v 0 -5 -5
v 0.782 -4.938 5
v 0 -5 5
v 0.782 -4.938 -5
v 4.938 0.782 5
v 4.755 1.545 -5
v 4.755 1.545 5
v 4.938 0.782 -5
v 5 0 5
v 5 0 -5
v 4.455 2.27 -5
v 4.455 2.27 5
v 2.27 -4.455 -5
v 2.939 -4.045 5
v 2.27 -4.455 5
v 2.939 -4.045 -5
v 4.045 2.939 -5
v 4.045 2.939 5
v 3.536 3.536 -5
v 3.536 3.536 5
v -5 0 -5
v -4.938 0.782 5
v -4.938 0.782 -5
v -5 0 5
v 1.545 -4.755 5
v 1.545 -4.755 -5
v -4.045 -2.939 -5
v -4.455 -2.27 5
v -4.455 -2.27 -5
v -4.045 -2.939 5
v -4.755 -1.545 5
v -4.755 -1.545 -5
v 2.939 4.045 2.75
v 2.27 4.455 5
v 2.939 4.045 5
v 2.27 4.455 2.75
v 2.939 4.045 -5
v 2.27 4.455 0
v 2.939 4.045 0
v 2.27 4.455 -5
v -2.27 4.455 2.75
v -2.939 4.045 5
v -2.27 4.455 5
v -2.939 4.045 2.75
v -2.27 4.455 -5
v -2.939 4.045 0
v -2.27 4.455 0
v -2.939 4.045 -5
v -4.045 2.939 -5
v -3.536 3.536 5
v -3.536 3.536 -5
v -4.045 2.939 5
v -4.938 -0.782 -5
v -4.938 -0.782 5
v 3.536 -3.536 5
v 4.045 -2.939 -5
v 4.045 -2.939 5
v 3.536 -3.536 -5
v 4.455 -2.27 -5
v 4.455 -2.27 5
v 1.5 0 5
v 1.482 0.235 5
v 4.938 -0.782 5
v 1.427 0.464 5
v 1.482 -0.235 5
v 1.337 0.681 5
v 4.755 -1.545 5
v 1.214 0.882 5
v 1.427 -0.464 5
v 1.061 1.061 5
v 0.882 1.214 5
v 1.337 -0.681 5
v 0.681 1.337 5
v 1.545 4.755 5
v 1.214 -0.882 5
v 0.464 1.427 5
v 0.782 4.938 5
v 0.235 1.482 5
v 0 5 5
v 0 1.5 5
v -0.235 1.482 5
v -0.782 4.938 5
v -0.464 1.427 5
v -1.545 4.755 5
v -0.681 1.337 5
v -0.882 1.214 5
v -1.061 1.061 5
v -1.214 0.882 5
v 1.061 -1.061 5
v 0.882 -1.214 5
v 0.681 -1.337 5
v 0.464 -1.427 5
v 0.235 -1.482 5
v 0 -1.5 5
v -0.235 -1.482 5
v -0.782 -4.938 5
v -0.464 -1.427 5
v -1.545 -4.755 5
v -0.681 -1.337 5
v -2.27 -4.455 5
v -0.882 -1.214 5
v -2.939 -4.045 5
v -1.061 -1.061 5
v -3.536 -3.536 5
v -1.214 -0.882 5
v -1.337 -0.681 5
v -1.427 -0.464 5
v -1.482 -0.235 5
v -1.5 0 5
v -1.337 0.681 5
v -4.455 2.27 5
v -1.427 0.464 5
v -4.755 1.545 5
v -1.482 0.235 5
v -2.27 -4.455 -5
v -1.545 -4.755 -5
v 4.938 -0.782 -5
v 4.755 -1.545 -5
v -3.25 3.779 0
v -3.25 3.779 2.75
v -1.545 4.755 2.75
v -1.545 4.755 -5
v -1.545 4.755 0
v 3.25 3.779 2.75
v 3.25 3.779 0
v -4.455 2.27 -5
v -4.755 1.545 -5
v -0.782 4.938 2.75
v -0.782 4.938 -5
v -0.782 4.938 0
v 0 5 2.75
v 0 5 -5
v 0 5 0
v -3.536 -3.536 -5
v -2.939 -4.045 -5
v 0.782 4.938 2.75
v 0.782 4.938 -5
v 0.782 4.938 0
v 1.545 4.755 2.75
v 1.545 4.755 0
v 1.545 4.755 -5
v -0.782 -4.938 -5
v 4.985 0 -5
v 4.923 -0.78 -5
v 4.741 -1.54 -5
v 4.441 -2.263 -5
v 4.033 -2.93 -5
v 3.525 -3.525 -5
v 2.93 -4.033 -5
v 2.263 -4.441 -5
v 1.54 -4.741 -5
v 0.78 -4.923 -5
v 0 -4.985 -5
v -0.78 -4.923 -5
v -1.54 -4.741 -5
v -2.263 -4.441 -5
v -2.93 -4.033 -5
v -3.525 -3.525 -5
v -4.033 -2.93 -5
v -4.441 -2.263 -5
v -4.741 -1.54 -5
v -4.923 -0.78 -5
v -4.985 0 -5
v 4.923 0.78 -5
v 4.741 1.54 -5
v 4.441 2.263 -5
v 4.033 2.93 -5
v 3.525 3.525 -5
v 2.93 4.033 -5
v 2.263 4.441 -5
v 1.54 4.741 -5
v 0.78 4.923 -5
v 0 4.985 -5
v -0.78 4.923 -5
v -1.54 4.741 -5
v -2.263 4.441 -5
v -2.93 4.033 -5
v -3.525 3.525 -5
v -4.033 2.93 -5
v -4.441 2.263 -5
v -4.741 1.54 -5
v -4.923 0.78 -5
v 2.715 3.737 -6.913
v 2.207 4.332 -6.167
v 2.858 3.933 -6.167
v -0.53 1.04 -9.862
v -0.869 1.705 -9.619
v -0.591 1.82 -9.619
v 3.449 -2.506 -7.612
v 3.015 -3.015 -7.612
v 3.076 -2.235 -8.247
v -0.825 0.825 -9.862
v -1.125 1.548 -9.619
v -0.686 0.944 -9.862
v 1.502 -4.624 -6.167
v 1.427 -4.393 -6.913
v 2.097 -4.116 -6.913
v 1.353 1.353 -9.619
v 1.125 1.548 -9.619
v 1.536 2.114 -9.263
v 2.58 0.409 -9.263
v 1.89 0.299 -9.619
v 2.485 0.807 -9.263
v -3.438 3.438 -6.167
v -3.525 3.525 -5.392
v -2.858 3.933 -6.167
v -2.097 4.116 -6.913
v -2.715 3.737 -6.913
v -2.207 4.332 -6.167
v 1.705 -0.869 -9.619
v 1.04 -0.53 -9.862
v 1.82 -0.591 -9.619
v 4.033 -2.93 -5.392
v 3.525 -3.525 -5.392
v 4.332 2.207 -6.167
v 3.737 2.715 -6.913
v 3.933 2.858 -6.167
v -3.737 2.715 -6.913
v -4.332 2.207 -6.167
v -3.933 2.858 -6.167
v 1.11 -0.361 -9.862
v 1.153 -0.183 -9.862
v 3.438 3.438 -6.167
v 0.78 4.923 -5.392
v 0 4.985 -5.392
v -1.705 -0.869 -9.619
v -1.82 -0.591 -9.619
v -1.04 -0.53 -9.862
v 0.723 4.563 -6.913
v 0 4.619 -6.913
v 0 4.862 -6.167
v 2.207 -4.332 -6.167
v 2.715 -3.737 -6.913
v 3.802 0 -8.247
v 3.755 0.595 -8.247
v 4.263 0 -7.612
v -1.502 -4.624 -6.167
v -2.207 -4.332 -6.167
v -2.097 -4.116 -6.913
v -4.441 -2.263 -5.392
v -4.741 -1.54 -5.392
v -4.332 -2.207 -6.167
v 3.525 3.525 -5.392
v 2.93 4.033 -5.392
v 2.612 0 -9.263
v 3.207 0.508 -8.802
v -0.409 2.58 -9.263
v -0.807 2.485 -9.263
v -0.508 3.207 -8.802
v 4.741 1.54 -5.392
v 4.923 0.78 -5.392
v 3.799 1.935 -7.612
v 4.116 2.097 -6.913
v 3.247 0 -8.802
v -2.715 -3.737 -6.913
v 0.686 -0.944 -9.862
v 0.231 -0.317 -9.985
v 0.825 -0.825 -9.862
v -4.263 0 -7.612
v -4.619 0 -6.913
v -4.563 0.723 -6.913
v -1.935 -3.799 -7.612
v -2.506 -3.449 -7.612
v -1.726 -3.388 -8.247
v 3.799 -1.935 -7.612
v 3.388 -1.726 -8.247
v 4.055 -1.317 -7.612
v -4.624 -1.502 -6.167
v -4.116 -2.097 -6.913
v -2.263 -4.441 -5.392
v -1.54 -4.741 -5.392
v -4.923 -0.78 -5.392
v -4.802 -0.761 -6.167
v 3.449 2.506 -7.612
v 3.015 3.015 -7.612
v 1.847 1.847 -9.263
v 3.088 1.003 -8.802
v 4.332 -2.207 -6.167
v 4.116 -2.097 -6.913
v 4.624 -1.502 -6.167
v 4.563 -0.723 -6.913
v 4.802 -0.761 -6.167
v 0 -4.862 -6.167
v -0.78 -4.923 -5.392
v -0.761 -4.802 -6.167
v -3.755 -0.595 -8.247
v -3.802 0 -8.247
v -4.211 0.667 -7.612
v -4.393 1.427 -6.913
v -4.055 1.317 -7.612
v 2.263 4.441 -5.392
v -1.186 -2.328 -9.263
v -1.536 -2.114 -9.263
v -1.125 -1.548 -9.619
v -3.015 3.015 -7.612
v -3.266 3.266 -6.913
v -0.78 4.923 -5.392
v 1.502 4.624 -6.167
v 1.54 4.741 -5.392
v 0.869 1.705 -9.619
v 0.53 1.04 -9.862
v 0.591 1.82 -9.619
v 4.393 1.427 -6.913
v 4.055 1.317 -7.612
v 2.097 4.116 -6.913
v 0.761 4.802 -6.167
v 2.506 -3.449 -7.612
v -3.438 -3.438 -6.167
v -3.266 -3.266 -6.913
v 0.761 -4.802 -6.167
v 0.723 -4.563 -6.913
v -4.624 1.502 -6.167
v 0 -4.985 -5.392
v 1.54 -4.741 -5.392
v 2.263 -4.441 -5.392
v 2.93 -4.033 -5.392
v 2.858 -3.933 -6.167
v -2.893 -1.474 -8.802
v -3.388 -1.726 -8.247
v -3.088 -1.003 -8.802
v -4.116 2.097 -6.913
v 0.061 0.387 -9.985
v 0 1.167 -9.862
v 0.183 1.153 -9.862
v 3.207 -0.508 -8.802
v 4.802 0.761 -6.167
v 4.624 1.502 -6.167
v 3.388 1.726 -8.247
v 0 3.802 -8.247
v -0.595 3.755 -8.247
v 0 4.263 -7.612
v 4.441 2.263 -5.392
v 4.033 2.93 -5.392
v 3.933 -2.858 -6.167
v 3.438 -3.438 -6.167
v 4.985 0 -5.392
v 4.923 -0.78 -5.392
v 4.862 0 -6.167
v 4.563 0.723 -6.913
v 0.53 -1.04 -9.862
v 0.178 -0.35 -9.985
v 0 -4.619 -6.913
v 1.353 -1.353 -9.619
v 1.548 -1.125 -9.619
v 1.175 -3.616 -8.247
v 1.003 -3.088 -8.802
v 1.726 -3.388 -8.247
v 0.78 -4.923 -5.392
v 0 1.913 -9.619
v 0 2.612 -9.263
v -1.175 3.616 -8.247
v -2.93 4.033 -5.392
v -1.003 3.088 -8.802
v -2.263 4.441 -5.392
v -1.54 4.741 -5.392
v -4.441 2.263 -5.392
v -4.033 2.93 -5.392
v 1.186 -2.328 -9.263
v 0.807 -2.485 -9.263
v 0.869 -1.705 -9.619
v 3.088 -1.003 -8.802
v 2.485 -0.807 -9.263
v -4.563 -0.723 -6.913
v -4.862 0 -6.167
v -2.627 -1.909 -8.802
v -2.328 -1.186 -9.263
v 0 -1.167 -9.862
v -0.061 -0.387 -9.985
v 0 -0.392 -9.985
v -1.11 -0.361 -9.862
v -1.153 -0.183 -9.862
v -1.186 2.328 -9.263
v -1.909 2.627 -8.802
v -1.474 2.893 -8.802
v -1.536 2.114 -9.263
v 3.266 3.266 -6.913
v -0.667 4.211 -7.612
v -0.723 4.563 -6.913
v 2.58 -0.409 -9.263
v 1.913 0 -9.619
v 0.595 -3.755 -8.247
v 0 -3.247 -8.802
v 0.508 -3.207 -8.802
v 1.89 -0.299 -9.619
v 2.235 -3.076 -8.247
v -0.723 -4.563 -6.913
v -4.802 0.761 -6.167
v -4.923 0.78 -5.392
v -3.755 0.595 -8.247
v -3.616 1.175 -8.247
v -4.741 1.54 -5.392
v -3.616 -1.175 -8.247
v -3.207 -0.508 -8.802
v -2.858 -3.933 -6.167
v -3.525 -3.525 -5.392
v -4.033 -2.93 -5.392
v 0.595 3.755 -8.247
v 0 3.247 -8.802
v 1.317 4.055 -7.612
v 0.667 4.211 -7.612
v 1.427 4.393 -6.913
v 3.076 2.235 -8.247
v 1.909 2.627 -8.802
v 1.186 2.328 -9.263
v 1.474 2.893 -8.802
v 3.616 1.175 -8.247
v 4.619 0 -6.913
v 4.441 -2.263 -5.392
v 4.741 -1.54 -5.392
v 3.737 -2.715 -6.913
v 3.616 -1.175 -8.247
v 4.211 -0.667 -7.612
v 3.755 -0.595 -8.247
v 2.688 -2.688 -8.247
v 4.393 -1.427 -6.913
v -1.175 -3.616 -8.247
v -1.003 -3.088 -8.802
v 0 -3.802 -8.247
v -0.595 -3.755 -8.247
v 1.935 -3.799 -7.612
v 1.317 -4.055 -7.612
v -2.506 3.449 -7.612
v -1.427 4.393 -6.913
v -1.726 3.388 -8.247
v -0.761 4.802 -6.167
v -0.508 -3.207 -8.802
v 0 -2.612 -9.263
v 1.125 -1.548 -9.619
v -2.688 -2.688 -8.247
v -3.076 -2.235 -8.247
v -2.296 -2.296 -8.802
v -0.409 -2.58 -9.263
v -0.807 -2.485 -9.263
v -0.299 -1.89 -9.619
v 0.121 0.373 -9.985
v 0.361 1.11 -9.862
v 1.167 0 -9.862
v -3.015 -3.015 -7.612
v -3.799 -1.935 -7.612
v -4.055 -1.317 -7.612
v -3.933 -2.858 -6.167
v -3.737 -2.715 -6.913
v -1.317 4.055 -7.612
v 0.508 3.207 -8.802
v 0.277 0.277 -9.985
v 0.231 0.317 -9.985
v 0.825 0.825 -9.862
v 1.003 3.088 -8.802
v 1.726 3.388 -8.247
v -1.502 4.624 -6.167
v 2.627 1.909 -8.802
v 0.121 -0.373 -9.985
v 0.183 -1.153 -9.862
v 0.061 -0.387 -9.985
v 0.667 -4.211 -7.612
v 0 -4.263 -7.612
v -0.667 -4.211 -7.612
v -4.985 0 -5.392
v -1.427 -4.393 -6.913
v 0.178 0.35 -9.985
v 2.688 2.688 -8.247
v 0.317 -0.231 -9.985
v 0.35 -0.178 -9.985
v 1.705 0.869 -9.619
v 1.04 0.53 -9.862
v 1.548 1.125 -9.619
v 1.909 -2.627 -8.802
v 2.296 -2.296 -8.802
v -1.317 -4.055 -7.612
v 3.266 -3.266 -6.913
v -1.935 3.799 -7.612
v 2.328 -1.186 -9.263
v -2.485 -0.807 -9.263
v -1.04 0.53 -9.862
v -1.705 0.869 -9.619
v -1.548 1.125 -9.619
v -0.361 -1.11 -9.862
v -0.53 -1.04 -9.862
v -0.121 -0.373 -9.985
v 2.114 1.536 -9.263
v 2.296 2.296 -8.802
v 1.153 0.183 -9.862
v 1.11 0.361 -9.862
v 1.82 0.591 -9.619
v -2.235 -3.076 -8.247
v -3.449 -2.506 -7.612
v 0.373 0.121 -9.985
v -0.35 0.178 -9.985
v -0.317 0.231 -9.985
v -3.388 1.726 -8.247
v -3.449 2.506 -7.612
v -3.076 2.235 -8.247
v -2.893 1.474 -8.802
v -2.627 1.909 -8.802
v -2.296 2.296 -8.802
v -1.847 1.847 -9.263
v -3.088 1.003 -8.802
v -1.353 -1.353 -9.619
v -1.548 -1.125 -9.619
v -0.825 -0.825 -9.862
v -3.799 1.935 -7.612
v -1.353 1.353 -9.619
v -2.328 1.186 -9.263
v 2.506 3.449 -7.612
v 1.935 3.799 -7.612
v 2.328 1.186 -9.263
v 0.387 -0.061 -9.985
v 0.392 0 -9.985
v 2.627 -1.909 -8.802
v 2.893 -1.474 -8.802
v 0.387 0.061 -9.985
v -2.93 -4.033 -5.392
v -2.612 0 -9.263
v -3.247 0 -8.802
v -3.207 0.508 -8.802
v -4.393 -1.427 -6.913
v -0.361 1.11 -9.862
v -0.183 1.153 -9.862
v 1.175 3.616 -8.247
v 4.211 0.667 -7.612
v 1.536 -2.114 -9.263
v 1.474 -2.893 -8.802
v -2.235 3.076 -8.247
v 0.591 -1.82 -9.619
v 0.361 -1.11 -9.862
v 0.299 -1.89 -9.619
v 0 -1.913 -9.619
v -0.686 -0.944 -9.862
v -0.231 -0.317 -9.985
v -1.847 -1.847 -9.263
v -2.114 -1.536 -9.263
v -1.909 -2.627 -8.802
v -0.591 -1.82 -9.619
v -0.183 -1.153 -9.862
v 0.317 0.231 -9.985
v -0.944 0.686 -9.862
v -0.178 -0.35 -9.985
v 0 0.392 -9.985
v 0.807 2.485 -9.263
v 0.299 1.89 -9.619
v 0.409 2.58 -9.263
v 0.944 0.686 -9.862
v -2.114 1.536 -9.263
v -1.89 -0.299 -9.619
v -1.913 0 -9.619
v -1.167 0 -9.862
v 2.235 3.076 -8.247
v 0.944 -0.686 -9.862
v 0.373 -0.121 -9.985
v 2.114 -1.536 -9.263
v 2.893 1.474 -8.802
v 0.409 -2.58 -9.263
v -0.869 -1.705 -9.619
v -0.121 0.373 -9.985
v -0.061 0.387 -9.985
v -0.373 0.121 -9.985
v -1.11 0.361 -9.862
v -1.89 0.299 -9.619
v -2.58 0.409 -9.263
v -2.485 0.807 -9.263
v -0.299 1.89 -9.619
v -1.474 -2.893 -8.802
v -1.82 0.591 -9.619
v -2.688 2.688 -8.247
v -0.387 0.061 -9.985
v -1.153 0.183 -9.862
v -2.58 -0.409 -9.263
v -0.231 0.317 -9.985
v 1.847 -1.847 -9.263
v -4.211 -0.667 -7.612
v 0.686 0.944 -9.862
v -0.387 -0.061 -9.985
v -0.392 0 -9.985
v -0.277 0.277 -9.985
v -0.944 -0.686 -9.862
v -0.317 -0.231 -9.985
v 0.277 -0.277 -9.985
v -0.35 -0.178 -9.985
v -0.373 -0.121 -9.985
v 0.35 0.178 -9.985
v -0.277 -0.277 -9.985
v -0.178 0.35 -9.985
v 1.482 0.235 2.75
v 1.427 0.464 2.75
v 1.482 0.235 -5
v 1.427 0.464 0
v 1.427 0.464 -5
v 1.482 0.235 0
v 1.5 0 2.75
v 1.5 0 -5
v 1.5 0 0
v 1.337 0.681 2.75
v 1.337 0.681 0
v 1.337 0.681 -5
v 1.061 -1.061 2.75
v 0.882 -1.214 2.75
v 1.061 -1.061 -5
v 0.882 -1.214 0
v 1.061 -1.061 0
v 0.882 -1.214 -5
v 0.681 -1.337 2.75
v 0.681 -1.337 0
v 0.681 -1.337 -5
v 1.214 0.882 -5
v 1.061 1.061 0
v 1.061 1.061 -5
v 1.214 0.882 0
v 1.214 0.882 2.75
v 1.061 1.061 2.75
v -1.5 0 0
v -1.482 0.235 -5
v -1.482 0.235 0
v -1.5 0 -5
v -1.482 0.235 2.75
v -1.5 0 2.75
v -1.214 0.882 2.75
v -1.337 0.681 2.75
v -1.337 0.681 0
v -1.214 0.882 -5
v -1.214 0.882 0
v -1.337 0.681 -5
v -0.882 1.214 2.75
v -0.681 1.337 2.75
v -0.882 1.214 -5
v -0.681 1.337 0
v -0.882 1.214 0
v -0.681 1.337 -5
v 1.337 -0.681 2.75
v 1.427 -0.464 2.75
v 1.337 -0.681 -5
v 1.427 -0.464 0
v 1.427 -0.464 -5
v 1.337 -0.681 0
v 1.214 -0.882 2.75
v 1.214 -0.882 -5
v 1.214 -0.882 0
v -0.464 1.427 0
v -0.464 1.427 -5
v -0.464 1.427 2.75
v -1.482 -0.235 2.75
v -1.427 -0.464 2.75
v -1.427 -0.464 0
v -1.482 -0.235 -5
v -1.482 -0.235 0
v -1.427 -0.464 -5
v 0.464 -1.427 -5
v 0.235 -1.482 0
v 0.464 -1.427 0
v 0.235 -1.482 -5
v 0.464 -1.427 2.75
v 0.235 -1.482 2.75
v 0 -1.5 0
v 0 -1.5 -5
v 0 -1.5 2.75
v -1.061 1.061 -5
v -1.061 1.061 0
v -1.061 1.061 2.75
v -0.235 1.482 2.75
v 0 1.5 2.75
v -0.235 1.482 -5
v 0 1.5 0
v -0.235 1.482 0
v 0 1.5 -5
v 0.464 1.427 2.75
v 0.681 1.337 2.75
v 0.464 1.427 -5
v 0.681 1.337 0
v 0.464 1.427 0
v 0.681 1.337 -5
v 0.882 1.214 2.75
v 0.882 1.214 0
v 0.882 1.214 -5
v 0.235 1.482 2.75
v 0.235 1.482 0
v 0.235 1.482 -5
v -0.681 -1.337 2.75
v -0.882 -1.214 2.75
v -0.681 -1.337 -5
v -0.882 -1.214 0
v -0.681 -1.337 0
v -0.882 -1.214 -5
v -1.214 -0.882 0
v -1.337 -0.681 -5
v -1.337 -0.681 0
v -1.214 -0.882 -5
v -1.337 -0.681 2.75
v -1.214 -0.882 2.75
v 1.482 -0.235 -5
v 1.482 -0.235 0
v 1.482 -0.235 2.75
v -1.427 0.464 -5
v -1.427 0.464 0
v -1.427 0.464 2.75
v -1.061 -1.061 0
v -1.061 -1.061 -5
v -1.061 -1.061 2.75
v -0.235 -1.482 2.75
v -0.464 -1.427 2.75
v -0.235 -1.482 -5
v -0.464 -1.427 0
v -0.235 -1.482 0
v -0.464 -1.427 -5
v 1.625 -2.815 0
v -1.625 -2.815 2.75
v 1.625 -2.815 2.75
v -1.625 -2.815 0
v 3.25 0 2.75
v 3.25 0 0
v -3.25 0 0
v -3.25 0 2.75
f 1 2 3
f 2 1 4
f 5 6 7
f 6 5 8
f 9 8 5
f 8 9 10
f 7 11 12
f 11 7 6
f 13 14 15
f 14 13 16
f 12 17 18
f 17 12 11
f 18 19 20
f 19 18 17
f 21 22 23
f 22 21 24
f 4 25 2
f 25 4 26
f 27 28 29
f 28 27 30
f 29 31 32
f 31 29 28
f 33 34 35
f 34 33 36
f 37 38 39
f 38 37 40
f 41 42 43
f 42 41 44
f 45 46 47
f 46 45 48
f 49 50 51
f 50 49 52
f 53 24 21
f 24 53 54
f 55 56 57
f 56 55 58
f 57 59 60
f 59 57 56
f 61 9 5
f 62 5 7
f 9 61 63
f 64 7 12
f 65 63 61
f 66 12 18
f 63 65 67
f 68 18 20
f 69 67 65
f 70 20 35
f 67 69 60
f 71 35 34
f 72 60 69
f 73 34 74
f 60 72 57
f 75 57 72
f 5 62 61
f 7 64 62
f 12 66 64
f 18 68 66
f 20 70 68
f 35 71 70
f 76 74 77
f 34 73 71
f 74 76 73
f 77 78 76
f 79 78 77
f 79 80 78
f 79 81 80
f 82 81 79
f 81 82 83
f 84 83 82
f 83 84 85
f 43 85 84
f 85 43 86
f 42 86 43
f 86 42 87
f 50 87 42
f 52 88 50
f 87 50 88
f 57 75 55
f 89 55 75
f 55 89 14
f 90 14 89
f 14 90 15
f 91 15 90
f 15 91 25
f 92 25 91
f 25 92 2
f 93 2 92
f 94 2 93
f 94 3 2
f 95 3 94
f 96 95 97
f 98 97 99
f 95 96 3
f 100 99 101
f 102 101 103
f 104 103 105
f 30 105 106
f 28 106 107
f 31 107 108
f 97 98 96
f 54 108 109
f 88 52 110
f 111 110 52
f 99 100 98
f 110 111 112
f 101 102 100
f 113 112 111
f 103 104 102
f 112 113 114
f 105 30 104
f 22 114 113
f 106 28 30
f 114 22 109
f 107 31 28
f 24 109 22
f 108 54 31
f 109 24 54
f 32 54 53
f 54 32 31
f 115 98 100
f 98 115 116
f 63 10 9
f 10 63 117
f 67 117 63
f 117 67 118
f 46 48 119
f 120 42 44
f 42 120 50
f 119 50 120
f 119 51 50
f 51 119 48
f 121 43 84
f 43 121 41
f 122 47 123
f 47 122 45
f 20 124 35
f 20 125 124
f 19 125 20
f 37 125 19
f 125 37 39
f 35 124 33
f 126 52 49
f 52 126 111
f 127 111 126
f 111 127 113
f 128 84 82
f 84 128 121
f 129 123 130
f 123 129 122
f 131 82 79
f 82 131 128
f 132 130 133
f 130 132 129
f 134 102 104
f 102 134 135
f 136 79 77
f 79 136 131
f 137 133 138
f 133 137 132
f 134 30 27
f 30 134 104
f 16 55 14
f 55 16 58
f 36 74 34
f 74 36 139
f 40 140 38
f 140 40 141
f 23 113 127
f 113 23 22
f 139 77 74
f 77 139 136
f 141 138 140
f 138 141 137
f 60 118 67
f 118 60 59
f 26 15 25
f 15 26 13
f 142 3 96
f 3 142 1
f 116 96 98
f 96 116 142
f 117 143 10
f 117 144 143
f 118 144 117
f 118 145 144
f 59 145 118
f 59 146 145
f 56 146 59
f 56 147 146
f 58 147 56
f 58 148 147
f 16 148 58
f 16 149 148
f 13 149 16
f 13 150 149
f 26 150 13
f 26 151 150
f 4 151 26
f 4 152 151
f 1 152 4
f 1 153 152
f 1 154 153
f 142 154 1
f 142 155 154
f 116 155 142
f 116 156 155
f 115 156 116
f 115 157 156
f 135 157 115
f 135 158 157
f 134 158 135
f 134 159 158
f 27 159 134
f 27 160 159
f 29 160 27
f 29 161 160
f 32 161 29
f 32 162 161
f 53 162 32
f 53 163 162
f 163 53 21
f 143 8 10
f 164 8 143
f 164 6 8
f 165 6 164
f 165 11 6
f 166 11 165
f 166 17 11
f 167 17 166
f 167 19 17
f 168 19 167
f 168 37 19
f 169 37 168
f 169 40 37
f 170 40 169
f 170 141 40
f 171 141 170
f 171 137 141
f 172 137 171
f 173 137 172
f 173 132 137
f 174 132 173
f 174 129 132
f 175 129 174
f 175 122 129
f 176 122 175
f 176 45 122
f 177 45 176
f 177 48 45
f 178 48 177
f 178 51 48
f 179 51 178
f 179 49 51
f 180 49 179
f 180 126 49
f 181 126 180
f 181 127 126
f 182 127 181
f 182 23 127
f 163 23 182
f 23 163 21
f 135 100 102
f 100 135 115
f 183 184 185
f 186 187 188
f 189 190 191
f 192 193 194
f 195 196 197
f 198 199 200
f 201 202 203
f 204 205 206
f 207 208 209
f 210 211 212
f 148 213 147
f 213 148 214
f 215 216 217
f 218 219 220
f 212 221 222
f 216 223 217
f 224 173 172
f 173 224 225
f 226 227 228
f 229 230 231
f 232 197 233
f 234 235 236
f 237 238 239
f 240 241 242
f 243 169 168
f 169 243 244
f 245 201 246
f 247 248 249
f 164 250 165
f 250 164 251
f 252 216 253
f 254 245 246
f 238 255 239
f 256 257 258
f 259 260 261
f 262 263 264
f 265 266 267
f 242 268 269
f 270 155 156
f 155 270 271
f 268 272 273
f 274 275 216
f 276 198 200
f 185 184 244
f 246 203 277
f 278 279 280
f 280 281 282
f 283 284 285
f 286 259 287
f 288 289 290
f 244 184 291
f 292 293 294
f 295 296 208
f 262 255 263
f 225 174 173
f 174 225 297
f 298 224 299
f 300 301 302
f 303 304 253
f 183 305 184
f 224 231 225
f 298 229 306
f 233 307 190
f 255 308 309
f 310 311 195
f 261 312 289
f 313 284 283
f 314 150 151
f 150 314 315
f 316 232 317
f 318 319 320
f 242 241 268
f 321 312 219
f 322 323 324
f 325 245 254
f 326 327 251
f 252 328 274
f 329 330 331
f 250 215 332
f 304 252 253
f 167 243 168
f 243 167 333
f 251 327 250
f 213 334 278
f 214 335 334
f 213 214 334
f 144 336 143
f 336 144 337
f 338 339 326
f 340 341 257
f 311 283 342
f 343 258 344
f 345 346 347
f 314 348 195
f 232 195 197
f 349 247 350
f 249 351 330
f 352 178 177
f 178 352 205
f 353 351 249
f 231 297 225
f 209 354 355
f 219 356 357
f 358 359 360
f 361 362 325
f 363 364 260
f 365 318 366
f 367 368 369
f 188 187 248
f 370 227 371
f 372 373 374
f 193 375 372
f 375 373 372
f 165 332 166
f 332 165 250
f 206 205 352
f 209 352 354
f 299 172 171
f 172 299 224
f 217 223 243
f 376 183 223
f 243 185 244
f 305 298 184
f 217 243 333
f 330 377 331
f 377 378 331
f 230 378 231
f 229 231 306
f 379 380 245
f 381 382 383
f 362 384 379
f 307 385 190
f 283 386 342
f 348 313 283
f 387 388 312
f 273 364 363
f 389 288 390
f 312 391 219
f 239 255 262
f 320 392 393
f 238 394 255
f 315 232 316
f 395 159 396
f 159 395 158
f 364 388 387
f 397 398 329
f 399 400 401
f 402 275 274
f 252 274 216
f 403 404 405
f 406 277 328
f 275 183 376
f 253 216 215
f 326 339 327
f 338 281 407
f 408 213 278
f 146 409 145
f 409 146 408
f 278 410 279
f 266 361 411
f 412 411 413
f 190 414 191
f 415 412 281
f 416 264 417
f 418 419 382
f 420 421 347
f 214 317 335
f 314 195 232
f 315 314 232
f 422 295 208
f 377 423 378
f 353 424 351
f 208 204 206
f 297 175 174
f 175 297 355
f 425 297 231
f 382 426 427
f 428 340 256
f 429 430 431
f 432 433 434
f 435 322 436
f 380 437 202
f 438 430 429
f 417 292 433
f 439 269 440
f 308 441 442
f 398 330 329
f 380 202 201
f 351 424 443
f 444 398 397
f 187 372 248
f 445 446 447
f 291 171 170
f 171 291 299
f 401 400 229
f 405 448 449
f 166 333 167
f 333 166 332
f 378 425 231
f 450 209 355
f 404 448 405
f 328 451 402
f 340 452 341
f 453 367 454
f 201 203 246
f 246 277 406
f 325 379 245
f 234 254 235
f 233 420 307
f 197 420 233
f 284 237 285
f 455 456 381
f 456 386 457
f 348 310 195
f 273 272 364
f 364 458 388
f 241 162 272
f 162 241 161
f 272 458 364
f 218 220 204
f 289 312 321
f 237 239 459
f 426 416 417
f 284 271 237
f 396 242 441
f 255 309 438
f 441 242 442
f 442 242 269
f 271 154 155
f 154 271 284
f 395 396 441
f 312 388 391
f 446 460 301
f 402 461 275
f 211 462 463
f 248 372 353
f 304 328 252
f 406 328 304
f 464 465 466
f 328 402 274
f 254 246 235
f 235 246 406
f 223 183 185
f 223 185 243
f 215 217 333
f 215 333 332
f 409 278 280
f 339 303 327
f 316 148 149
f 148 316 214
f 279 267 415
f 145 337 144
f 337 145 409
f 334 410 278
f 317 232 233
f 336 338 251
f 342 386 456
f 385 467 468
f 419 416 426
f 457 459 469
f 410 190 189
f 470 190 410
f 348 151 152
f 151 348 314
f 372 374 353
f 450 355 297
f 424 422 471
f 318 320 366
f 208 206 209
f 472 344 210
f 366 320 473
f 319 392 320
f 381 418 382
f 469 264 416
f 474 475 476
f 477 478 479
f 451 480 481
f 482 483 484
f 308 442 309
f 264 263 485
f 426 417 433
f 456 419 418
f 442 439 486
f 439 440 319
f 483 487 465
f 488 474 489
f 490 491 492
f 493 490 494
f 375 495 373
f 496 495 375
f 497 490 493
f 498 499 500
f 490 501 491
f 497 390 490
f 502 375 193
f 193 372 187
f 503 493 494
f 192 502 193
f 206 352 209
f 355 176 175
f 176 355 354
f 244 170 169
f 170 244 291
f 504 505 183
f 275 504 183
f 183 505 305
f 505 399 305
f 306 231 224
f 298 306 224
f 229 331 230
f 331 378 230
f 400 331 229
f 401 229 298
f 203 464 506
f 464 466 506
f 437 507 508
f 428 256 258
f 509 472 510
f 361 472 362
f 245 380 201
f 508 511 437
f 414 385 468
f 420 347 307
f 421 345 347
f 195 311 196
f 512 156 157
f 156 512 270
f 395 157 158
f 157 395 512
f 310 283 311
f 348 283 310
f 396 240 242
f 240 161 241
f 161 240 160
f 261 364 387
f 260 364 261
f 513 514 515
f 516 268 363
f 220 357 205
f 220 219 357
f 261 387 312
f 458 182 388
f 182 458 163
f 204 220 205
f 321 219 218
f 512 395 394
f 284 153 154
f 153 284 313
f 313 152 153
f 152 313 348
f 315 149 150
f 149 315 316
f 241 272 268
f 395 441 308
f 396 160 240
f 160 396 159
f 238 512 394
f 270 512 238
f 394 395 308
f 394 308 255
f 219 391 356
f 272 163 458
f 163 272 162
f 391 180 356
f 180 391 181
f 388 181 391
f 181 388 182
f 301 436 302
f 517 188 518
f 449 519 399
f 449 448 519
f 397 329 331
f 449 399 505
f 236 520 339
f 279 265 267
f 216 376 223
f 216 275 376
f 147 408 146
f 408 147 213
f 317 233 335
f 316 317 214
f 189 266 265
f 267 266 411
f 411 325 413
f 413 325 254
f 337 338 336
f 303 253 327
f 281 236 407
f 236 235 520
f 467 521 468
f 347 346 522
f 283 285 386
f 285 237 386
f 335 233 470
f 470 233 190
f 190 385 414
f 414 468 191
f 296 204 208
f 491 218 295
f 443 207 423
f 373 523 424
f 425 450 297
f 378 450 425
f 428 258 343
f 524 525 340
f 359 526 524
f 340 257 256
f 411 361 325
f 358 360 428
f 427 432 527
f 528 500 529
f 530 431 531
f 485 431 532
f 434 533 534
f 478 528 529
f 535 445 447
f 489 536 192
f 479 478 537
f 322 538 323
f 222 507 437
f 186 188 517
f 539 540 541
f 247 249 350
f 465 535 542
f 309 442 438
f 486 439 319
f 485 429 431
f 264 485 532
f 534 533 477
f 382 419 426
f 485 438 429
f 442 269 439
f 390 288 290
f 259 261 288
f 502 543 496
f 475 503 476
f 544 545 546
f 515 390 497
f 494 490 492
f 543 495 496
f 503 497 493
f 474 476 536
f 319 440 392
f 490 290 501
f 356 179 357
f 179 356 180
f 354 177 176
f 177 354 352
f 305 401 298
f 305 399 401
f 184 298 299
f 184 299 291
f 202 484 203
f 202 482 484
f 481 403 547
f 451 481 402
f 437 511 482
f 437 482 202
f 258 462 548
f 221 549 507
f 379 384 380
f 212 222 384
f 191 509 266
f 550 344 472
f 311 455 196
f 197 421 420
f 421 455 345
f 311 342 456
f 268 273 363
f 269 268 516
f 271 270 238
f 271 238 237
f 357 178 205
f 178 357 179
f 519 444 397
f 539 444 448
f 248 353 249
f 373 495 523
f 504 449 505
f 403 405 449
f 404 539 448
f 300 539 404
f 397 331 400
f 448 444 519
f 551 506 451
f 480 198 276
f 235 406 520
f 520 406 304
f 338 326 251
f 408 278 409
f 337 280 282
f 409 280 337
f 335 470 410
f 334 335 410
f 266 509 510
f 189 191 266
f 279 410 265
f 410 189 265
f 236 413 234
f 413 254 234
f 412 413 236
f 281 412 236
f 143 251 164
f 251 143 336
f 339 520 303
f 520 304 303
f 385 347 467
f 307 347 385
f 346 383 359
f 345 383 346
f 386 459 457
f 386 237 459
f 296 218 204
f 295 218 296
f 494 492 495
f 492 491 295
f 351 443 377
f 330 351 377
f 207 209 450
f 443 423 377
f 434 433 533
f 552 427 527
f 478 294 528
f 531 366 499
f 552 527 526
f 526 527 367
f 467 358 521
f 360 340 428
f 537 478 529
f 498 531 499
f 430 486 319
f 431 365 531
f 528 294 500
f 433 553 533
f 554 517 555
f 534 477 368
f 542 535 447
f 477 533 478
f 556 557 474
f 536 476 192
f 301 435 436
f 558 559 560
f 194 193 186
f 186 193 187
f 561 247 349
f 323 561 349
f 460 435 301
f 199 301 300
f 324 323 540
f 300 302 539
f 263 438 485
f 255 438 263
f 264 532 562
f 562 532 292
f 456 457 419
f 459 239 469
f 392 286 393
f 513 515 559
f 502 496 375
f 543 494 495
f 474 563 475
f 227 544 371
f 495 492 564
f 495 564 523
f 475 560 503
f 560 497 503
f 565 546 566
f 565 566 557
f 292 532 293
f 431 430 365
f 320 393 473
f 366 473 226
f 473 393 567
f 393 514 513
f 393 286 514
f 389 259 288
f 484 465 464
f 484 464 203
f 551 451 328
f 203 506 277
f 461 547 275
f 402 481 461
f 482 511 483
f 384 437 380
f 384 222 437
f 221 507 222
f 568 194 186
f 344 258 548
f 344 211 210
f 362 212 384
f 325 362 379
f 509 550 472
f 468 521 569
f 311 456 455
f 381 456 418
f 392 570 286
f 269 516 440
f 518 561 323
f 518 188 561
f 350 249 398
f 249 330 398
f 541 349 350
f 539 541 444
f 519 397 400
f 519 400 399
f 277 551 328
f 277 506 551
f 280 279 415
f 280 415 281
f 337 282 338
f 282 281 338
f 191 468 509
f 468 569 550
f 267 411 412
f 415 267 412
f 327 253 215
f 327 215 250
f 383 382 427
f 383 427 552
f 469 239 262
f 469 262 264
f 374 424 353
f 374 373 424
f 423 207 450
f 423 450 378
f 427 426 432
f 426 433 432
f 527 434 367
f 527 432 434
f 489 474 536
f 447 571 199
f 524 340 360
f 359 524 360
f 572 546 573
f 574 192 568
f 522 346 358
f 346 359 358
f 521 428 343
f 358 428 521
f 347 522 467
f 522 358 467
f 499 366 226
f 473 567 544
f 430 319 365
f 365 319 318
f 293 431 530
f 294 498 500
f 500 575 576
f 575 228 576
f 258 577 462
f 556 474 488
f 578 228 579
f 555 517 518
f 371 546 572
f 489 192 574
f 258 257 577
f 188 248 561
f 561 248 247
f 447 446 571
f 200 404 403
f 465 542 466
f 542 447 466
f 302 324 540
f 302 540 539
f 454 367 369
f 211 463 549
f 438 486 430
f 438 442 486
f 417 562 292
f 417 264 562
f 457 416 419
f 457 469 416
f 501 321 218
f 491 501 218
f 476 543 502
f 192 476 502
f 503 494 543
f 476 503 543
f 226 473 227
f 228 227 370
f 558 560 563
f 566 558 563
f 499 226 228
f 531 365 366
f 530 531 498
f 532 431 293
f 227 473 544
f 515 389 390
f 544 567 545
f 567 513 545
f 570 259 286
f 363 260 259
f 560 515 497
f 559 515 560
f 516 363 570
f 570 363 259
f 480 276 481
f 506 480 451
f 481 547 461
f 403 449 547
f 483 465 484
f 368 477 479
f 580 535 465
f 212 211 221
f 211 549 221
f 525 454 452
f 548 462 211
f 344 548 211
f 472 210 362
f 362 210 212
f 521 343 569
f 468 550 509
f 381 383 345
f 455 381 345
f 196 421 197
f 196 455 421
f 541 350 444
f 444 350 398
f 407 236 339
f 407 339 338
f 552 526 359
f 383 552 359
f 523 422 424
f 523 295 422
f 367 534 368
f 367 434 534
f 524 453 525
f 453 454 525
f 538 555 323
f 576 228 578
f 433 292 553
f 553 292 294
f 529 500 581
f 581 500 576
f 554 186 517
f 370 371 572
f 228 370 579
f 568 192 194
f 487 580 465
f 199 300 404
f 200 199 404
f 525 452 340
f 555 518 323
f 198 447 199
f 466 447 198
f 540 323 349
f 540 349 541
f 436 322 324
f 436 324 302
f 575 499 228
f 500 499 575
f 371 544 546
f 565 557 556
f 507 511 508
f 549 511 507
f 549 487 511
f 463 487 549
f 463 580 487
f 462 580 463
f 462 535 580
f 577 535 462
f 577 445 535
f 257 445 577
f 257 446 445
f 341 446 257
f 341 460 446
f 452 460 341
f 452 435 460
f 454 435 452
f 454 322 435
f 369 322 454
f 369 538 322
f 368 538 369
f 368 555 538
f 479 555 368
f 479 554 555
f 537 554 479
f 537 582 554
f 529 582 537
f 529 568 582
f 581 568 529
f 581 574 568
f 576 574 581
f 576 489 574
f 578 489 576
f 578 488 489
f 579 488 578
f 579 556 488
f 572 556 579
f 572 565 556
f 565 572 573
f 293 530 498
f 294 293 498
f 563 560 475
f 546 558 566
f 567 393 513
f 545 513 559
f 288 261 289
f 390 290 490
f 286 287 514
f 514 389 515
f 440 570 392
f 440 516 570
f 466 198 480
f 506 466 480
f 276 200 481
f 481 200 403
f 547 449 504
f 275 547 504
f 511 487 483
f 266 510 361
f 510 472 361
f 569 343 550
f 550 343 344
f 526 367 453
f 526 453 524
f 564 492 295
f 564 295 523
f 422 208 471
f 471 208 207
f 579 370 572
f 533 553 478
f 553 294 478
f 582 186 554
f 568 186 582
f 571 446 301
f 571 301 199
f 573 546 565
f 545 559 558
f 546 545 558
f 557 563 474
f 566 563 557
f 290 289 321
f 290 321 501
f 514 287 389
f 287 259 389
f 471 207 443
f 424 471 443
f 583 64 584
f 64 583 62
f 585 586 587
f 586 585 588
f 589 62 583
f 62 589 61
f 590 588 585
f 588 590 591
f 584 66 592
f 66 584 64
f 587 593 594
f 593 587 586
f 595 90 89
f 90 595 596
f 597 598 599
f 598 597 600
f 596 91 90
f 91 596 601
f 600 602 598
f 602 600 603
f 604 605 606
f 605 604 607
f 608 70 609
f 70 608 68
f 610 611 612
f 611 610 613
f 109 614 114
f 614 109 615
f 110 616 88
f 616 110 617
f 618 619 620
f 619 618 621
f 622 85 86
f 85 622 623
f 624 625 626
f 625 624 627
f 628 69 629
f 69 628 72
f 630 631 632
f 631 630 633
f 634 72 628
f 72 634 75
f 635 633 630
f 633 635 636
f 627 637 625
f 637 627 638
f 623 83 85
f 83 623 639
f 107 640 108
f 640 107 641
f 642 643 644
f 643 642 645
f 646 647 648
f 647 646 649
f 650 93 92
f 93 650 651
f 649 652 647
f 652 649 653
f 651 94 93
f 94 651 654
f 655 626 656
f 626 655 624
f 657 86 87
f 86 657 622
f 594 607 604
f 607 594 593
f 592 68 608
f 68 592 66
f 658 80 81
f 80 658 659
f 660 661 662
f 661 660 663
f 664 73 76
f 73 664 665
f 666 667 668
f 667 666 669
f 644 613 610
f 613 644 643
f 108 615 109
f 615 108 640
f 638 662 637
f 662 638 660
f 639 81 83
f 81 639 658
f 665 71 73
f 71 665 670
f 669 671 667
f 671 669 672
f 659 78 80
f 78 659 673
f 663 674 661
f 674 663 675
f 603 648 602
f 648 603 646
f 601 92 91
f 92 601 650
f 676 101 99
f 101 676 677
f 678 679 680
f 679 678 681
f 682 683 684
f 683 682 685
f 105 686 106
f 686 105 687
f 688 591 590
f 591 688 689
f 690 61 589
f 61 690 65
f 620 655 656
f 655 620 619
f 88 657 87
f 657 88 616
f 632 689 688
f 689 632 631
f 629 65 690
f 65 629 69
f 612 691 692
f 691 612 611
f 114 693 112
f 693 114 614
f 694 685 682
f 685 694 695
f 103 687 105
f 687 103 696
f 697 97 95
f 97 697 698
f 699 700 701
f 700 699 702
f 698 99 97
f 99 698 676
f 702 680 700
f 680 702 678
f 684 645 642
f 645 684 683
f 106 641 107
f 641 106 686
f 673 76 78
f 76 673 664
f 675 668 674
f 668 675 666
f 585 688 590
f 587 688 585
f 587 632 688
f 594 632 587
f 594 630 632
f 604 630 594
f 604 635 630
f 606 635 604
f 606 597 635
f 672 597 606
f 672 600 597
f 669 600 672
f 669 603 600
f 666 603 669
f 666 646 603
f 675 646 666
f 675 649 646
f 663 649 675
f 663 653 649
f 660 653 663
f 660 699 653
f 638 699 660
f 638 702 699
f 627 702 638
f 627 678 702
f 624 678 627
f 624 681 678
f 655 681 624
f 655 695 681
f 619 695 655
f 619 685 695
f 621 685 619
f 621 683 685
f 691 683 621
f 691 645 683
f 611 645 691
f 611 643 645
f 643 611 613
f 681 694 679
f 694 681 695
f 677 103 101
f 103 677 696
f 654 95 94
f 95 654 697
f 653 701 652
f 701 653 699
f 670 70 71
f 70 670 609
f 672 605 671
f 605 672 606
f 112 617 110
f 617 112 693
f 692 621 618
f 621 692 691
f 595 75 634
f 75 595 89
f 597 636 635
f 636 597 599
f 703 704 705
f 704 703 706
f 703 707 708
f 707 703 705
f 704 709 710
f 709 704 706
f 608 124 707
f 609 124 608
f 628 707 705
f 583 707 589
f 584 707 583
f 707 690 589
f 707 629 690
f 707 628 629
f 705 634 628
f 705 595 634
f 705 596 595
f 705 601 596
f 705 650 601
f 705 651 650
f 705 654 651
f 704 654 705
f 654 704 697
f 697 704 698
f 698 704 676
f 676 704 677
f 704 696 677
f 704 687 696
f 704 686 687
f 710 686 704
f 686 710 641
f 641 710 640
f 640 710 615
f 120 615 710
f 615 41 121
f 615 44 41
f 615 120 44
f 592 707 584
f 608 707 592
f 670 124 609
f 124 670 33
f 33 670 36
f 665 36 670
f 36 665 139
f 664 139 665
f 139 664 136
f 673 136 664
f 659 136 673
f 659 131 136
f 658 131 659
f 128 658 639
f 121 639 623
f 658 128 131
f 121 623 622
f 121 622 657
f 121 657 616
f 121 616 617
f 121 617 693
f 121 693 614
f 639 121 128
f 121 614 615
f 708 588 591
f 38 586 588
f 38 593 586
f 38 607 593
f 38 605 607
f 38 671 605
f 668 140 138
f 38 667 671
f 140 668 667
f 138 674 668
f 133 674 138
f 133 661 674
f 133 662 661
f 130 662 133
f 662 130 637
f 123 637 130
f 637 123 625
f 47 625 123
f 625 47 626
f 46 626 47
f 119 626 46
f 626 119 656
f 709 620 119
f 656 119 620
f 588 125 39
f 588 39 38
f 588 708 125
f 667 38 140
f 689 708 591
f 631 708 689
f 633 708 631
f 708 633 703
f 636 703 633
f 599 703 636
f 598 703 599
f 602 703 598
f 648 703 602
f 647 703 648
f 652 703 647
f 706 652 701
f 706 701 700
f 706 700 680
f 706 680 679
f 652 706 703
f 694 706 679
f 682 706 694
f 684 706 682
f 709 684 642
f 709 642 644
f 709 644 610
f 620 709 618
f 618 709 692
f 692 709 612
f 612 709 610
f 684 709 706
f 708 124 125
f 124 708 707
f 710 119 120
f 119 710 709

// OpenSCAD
/*
Quadrysteria QR200 landing feet  (c) by Jorge Monteiro

Quadrysteria QR200 landing feet is licensed under a
Creative Commons Attribution-ShareAlike 4.0 International.

You should have received a copy of the license along with this
work.  If not, see <http://creativecommons.org/licenses/by-sa/4.0/>.
*/
/* [Basics] */
// Set 0 to use M2.5 screw and nuts or 1 to use M3 screw and nuts
useM3nut=0;//[0:1]

/* [Ignore] */
$fn=40*1;
m25nut=5*1;
m25nuth=2*1;
m25screw=2.5*1;
m3nut=5.5*1;
m3nuth=2.4*1;
m3screw=3*1;
gap=0.5*1;

if (useM3nut==1) {
    echo("M3");
    screw=m3screw+gap;
    nut=m3nut+gap*3;
    nutHeight=m3nuth+gap*1.5;
    drawFoot(screw, nut, nutHeight);

} else {
    screw=m25screw+gap;
    nut=m25nut+gap*3;
    nutHeight=m25nuth+gap*1.5;
    
    drawFoot(screw, nut, nutHeight);
}

module drawFoot(screw, nut, nutHeight) {
    difference() {
        translate([0,0,-5])
        difference() {
            union(){
                cylinder(10, 5, 5);
                sphere(r=5);
            }
            cylinder(10, screw/2, screw/2);
        }
        // draw the nut hole
        cylinder(nutHeight, nut/2, nut/2, $fn=6);
        // and the openning to insert the nut
        translate([-nut/2,0,0]) cube([nut,nut,nutHeight]);
        
    }
};
